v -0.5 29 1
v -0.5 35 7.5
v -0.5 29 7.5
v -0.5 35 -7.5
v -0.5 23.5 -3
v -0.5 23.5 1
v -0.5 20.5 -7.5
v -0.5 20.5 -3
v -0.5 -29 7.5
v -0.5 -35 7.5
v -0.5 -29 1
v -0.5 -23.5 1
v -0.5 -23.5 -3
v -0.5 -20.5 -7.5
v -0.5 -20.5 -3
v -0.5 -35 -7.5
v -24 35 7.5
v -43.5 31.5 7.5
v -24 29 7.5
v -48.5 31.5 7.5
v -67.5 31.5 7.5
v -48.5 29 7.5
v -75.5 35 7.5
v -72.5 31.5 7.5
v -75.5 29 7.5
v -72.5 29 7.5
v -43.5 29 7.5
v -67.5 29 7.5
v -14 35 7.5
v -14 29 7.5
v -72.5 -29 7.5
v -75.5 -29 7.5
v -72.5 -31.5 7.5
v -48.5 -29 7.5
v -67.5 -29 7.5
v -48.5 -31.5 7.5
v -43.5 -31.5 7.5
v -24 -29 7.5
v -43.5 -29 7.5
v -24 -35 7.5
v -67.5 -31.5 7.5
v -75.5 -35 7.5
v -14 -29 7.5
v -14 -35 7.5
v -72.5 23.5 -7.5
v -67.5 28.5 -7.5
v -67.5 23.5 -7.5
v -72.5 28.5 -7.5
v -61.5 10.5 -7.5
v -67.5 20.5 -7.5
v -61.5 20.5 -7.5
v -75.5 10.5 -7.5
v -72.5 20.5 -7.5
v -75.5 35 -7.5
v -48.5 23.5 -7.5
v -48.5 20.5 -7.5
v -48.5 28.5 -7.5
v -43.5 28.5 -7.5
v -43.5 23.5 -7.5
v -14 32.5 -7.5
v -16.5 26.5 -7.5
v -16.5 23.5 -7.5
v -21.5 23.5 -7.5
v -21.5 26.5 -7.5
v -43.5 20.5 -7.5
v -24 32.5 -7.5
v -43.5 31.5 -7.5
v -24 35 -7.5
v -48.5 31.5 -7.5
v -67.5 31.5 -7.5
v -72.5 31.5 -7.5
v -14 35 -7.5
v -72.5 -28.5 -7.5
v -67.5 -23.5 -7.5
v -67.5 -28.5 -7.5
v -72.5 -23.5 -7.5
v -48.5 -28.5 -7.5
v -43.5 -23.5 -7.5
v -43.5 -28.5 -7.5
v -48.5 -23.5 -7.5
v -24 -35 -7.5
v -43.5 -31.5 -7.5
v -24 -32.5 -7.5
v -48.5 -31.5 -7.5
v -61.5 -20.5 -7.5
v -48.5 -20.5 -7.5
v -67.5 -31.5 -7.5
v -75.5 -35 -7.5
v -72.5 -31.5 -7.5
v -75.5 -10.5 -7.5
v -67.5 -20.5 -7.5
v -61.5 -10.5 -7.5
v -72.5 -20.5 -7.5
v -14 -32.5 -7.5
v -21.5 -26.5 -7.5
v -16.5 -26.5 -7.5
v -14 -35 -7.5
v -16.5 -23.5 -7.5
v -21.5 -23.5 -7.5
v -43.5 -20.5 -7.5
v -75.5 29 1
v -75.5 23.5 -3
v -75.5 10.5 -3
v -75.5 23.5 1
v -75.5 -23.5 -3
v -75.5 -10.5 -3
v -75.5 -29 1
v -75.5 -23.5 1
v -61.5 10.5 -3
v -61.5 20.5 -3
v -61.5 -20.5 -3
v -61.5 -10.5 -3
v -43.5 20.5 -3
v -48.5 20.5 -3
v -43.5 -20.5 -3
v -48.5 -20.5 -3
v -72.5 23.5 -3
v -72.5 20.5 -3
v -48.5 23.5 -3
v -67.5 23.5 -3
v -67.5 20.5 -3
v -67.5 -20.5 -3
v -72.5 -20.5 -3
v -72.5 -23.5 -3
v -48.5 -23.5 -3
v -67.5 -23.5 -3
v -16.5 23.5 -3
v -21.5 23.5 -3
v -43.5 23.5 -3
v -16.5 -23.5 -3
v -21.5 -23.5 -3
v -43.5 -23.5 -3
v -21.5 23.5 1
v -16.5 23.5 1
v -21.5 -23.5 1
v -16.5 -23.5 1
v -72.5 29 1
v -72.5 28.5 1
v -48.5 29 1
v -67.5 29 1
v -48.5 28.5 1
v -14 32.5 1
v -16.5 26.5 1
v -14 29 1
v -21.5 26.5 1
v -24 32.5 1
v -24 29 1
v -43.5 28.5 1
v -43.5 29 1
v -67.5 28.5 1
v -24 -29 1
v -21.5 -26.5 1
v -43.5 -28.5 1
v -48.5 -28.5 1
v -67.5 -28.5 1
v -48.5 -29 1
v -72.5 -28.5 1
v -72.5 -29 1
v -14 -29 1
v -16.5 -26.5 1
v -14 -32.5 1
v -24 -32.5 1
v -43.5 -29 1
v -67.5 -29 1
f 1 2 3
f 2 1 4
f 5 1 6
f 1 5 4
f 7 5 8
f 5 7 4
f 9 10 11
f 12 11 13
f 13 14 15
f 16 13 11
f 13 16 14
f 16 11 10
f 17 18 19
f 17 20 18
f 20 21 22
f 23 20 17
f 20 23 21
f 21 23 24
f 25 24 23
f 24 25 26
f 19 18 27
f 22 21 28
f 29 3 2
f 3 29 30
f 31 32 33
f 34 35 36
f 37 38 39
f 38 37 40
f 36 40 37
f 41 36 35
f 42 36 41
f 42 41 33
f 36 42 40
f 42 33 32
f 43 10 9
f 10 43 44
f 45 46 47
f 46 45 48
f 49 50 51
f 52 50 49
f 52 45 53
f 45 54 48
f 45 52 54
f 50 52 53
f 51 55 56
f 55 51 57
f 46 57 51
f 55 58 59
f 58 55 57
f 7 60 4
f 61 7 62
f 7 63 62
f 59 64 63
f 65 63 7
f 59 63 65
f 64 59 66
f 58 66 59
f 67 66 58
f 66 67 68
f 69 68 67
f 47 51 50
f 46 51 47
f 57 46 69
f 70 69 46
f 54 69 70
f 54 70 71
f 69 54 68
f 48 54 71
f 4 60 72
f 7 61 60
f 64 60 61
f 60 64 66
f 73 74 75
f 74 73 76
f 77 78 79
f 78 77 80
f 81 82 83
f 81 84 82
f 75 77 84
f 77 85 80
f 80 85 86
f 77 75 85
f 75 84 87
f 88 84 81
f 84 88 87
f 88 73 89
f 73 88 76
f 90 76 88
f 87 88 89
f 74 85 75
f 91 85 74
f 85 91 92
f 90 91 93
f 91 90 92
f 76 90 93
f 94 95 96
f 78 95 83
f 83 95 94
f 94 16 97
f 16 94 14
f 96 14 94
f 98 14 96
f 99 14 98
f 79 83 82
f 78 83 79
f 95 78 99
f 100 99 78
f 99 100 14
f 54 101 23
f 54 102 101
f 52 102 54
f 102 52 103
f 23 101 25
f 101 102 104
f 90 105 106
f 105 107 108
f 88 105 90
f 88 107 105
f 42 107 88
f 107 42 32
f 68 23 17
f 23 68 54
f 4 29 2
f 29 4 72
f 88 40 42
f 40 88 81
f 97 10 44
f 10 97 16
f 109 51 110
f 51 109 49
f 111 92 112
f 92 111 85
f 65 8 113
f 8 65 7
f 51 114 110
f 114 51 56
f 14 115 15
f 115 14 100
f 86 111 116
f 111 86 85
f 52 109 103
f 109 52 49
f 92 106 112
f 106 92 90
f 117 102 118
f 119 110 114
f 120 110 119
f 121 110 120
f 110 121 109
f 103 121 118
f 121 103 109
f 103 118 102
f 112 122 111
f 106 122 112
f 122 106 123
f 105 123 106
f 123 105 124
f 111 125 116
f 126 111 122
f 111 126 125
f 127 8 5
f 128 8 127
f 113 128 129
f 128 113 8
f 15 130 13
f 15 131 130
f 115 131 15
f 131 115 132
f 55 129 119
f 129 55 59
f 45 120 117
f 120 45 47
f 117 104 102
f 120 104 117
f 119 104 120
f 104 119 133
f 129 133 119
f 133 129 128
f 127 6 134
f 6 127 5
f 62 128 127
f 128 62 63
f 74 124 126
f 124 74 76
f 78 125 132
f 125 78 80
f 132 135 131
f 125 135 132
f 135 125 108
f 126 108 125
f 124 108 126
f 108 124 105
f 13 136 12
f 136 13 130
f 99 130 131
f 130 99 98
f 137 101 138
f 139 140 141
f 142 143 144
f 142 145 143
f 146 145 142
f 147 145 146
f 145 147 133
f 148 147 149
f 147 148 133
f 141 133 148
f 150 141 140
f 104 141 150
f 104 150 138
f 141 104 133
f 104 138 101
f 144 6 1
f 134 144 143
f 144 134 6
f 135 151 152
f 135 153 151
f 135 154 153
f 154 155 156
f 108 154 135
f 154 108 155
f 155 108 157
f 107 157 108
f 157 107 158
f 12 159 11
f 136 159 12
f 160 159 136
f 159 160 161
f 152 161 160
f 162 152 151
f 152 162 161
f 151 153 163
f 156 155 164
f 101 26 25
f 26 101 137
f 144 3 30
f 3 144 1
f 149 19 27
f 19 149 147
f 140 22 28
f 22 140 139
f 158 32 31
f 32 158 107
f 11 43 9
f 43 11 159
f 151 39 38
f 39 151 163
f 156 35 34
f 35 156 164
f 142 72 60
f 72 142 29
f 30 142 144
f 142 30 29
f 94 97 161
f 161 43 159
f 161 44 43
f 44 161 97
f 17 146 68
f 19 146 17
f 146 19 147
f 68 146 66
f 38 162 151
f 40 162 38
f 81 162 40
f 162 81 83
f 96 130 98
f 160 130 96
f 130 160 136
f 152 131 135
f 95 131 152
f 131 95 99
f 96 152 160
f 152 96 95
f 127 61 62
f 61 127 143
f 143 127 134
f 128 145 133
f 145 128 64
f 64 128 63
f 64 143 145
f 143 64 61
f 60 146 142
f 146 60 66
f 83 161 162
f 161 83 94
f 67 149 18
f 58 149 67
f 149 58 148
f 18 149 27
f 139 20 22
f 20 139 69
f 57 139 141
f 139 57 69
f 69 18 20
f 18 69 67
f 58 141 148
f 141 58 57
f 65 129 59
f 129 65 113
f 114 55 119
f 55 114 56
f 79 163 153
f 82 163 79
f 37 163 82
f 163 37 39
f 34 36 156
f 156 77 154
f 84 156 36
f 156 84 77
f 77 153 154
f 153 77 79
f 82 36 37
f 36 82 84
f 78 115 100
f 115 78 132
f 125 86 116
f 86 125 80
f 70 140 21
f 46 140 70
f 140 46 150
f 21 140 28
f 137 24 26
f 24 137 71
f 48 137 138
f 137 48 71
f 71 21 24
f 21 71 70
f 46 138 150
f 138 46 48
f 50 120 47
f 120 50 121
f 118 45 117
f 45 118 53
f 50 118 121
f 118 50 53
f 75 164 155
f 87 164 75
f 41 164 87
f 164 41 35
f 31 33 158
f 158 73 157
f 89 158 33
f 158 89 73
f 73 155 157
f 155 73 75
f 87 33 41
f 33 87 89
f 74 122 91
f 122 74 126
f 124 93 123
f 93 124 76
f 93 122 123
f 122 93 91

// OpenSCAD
// WASABI Niko FDM Printer
// X rod mod
// GNU GPL v3
// SANTA no Mix
// https://ameblo.jp/math-physics/theme-10117154956.html
// https://github.com/SantaNoMix/
$fn = 100;
difference () {
    union () {
        difference () {
            translate ([-38,0,0]) {
                cube ([75,70,15],center = true);
            }
            translate ([-27.5,0,0]) {
                cube ([68,41,17],center = true);
            }
            translate ([-27.5,0,0]) {
                cube ([98,21,17],center = true);
            }
        }
    }
    translate ([0,0,2.5]) {
        cube ([160,47,11],center = true);
    }
    translate ([0,25,5]) {
        cube ([177,8,8],center = true);
    }
    translate ([0,-25,5]) {
        cube ([177,8,8],center = true);
    }
    translate ([5,-25,5]) {
        cube ([10,178,8],center = true);
    }
    translate ([-19,-25,5]) {
        cube ([10,178,8],center = true);
    }
    translate ([5,-25,5]) {
        cube ([5,3,38],center = true);
    }
    translate ([-19,-25,5]) {
        cube ([5,3,38],center = true);
    }
    translate ([5,25,5]) {
        cube ([5,3,38],center = true);
    }
    translate ([-19,25,5]) {
        cube ([5,3,38],center = true);
    }
    translate ([5,34,5]) {
        cube ([10,3,38],center = true);
    }
    translate ([-19,34,5]) {
        cube ([10,3,38],center = true);
    }
    translate ([5,-34,5]) {
        cube ([10,3,38],center = true);
    }
    translate ([-19,-34,5]) {
        cube ([10,3,38],center = true);
    }
    translate ([-46,30,5]) {
        cube ([5,3,38],center = true);
    }
    translate ([-46,22,5]) {
        cube ([5,3,38],center = true);
    }
    translate ([-46,-30,5]) {
        cube ([5,3,38],center = true);
    }
    translate ([-46,-22,5]) {
        cube ([5,3,38],center = true);
    }
    translate ([-70,30,5]) {
        cube ([5,3,38],center = true);
    }
    translate ([-70,22,5]) {
        cube ([5,3,38],center = true);
    }
    translate ([-70,-30,5]) {
        cube ([5,3,38],center = true);
    }
    translate ([-70,-22,5]) {
        cube ([5,3,38],center = true);
    }
}
